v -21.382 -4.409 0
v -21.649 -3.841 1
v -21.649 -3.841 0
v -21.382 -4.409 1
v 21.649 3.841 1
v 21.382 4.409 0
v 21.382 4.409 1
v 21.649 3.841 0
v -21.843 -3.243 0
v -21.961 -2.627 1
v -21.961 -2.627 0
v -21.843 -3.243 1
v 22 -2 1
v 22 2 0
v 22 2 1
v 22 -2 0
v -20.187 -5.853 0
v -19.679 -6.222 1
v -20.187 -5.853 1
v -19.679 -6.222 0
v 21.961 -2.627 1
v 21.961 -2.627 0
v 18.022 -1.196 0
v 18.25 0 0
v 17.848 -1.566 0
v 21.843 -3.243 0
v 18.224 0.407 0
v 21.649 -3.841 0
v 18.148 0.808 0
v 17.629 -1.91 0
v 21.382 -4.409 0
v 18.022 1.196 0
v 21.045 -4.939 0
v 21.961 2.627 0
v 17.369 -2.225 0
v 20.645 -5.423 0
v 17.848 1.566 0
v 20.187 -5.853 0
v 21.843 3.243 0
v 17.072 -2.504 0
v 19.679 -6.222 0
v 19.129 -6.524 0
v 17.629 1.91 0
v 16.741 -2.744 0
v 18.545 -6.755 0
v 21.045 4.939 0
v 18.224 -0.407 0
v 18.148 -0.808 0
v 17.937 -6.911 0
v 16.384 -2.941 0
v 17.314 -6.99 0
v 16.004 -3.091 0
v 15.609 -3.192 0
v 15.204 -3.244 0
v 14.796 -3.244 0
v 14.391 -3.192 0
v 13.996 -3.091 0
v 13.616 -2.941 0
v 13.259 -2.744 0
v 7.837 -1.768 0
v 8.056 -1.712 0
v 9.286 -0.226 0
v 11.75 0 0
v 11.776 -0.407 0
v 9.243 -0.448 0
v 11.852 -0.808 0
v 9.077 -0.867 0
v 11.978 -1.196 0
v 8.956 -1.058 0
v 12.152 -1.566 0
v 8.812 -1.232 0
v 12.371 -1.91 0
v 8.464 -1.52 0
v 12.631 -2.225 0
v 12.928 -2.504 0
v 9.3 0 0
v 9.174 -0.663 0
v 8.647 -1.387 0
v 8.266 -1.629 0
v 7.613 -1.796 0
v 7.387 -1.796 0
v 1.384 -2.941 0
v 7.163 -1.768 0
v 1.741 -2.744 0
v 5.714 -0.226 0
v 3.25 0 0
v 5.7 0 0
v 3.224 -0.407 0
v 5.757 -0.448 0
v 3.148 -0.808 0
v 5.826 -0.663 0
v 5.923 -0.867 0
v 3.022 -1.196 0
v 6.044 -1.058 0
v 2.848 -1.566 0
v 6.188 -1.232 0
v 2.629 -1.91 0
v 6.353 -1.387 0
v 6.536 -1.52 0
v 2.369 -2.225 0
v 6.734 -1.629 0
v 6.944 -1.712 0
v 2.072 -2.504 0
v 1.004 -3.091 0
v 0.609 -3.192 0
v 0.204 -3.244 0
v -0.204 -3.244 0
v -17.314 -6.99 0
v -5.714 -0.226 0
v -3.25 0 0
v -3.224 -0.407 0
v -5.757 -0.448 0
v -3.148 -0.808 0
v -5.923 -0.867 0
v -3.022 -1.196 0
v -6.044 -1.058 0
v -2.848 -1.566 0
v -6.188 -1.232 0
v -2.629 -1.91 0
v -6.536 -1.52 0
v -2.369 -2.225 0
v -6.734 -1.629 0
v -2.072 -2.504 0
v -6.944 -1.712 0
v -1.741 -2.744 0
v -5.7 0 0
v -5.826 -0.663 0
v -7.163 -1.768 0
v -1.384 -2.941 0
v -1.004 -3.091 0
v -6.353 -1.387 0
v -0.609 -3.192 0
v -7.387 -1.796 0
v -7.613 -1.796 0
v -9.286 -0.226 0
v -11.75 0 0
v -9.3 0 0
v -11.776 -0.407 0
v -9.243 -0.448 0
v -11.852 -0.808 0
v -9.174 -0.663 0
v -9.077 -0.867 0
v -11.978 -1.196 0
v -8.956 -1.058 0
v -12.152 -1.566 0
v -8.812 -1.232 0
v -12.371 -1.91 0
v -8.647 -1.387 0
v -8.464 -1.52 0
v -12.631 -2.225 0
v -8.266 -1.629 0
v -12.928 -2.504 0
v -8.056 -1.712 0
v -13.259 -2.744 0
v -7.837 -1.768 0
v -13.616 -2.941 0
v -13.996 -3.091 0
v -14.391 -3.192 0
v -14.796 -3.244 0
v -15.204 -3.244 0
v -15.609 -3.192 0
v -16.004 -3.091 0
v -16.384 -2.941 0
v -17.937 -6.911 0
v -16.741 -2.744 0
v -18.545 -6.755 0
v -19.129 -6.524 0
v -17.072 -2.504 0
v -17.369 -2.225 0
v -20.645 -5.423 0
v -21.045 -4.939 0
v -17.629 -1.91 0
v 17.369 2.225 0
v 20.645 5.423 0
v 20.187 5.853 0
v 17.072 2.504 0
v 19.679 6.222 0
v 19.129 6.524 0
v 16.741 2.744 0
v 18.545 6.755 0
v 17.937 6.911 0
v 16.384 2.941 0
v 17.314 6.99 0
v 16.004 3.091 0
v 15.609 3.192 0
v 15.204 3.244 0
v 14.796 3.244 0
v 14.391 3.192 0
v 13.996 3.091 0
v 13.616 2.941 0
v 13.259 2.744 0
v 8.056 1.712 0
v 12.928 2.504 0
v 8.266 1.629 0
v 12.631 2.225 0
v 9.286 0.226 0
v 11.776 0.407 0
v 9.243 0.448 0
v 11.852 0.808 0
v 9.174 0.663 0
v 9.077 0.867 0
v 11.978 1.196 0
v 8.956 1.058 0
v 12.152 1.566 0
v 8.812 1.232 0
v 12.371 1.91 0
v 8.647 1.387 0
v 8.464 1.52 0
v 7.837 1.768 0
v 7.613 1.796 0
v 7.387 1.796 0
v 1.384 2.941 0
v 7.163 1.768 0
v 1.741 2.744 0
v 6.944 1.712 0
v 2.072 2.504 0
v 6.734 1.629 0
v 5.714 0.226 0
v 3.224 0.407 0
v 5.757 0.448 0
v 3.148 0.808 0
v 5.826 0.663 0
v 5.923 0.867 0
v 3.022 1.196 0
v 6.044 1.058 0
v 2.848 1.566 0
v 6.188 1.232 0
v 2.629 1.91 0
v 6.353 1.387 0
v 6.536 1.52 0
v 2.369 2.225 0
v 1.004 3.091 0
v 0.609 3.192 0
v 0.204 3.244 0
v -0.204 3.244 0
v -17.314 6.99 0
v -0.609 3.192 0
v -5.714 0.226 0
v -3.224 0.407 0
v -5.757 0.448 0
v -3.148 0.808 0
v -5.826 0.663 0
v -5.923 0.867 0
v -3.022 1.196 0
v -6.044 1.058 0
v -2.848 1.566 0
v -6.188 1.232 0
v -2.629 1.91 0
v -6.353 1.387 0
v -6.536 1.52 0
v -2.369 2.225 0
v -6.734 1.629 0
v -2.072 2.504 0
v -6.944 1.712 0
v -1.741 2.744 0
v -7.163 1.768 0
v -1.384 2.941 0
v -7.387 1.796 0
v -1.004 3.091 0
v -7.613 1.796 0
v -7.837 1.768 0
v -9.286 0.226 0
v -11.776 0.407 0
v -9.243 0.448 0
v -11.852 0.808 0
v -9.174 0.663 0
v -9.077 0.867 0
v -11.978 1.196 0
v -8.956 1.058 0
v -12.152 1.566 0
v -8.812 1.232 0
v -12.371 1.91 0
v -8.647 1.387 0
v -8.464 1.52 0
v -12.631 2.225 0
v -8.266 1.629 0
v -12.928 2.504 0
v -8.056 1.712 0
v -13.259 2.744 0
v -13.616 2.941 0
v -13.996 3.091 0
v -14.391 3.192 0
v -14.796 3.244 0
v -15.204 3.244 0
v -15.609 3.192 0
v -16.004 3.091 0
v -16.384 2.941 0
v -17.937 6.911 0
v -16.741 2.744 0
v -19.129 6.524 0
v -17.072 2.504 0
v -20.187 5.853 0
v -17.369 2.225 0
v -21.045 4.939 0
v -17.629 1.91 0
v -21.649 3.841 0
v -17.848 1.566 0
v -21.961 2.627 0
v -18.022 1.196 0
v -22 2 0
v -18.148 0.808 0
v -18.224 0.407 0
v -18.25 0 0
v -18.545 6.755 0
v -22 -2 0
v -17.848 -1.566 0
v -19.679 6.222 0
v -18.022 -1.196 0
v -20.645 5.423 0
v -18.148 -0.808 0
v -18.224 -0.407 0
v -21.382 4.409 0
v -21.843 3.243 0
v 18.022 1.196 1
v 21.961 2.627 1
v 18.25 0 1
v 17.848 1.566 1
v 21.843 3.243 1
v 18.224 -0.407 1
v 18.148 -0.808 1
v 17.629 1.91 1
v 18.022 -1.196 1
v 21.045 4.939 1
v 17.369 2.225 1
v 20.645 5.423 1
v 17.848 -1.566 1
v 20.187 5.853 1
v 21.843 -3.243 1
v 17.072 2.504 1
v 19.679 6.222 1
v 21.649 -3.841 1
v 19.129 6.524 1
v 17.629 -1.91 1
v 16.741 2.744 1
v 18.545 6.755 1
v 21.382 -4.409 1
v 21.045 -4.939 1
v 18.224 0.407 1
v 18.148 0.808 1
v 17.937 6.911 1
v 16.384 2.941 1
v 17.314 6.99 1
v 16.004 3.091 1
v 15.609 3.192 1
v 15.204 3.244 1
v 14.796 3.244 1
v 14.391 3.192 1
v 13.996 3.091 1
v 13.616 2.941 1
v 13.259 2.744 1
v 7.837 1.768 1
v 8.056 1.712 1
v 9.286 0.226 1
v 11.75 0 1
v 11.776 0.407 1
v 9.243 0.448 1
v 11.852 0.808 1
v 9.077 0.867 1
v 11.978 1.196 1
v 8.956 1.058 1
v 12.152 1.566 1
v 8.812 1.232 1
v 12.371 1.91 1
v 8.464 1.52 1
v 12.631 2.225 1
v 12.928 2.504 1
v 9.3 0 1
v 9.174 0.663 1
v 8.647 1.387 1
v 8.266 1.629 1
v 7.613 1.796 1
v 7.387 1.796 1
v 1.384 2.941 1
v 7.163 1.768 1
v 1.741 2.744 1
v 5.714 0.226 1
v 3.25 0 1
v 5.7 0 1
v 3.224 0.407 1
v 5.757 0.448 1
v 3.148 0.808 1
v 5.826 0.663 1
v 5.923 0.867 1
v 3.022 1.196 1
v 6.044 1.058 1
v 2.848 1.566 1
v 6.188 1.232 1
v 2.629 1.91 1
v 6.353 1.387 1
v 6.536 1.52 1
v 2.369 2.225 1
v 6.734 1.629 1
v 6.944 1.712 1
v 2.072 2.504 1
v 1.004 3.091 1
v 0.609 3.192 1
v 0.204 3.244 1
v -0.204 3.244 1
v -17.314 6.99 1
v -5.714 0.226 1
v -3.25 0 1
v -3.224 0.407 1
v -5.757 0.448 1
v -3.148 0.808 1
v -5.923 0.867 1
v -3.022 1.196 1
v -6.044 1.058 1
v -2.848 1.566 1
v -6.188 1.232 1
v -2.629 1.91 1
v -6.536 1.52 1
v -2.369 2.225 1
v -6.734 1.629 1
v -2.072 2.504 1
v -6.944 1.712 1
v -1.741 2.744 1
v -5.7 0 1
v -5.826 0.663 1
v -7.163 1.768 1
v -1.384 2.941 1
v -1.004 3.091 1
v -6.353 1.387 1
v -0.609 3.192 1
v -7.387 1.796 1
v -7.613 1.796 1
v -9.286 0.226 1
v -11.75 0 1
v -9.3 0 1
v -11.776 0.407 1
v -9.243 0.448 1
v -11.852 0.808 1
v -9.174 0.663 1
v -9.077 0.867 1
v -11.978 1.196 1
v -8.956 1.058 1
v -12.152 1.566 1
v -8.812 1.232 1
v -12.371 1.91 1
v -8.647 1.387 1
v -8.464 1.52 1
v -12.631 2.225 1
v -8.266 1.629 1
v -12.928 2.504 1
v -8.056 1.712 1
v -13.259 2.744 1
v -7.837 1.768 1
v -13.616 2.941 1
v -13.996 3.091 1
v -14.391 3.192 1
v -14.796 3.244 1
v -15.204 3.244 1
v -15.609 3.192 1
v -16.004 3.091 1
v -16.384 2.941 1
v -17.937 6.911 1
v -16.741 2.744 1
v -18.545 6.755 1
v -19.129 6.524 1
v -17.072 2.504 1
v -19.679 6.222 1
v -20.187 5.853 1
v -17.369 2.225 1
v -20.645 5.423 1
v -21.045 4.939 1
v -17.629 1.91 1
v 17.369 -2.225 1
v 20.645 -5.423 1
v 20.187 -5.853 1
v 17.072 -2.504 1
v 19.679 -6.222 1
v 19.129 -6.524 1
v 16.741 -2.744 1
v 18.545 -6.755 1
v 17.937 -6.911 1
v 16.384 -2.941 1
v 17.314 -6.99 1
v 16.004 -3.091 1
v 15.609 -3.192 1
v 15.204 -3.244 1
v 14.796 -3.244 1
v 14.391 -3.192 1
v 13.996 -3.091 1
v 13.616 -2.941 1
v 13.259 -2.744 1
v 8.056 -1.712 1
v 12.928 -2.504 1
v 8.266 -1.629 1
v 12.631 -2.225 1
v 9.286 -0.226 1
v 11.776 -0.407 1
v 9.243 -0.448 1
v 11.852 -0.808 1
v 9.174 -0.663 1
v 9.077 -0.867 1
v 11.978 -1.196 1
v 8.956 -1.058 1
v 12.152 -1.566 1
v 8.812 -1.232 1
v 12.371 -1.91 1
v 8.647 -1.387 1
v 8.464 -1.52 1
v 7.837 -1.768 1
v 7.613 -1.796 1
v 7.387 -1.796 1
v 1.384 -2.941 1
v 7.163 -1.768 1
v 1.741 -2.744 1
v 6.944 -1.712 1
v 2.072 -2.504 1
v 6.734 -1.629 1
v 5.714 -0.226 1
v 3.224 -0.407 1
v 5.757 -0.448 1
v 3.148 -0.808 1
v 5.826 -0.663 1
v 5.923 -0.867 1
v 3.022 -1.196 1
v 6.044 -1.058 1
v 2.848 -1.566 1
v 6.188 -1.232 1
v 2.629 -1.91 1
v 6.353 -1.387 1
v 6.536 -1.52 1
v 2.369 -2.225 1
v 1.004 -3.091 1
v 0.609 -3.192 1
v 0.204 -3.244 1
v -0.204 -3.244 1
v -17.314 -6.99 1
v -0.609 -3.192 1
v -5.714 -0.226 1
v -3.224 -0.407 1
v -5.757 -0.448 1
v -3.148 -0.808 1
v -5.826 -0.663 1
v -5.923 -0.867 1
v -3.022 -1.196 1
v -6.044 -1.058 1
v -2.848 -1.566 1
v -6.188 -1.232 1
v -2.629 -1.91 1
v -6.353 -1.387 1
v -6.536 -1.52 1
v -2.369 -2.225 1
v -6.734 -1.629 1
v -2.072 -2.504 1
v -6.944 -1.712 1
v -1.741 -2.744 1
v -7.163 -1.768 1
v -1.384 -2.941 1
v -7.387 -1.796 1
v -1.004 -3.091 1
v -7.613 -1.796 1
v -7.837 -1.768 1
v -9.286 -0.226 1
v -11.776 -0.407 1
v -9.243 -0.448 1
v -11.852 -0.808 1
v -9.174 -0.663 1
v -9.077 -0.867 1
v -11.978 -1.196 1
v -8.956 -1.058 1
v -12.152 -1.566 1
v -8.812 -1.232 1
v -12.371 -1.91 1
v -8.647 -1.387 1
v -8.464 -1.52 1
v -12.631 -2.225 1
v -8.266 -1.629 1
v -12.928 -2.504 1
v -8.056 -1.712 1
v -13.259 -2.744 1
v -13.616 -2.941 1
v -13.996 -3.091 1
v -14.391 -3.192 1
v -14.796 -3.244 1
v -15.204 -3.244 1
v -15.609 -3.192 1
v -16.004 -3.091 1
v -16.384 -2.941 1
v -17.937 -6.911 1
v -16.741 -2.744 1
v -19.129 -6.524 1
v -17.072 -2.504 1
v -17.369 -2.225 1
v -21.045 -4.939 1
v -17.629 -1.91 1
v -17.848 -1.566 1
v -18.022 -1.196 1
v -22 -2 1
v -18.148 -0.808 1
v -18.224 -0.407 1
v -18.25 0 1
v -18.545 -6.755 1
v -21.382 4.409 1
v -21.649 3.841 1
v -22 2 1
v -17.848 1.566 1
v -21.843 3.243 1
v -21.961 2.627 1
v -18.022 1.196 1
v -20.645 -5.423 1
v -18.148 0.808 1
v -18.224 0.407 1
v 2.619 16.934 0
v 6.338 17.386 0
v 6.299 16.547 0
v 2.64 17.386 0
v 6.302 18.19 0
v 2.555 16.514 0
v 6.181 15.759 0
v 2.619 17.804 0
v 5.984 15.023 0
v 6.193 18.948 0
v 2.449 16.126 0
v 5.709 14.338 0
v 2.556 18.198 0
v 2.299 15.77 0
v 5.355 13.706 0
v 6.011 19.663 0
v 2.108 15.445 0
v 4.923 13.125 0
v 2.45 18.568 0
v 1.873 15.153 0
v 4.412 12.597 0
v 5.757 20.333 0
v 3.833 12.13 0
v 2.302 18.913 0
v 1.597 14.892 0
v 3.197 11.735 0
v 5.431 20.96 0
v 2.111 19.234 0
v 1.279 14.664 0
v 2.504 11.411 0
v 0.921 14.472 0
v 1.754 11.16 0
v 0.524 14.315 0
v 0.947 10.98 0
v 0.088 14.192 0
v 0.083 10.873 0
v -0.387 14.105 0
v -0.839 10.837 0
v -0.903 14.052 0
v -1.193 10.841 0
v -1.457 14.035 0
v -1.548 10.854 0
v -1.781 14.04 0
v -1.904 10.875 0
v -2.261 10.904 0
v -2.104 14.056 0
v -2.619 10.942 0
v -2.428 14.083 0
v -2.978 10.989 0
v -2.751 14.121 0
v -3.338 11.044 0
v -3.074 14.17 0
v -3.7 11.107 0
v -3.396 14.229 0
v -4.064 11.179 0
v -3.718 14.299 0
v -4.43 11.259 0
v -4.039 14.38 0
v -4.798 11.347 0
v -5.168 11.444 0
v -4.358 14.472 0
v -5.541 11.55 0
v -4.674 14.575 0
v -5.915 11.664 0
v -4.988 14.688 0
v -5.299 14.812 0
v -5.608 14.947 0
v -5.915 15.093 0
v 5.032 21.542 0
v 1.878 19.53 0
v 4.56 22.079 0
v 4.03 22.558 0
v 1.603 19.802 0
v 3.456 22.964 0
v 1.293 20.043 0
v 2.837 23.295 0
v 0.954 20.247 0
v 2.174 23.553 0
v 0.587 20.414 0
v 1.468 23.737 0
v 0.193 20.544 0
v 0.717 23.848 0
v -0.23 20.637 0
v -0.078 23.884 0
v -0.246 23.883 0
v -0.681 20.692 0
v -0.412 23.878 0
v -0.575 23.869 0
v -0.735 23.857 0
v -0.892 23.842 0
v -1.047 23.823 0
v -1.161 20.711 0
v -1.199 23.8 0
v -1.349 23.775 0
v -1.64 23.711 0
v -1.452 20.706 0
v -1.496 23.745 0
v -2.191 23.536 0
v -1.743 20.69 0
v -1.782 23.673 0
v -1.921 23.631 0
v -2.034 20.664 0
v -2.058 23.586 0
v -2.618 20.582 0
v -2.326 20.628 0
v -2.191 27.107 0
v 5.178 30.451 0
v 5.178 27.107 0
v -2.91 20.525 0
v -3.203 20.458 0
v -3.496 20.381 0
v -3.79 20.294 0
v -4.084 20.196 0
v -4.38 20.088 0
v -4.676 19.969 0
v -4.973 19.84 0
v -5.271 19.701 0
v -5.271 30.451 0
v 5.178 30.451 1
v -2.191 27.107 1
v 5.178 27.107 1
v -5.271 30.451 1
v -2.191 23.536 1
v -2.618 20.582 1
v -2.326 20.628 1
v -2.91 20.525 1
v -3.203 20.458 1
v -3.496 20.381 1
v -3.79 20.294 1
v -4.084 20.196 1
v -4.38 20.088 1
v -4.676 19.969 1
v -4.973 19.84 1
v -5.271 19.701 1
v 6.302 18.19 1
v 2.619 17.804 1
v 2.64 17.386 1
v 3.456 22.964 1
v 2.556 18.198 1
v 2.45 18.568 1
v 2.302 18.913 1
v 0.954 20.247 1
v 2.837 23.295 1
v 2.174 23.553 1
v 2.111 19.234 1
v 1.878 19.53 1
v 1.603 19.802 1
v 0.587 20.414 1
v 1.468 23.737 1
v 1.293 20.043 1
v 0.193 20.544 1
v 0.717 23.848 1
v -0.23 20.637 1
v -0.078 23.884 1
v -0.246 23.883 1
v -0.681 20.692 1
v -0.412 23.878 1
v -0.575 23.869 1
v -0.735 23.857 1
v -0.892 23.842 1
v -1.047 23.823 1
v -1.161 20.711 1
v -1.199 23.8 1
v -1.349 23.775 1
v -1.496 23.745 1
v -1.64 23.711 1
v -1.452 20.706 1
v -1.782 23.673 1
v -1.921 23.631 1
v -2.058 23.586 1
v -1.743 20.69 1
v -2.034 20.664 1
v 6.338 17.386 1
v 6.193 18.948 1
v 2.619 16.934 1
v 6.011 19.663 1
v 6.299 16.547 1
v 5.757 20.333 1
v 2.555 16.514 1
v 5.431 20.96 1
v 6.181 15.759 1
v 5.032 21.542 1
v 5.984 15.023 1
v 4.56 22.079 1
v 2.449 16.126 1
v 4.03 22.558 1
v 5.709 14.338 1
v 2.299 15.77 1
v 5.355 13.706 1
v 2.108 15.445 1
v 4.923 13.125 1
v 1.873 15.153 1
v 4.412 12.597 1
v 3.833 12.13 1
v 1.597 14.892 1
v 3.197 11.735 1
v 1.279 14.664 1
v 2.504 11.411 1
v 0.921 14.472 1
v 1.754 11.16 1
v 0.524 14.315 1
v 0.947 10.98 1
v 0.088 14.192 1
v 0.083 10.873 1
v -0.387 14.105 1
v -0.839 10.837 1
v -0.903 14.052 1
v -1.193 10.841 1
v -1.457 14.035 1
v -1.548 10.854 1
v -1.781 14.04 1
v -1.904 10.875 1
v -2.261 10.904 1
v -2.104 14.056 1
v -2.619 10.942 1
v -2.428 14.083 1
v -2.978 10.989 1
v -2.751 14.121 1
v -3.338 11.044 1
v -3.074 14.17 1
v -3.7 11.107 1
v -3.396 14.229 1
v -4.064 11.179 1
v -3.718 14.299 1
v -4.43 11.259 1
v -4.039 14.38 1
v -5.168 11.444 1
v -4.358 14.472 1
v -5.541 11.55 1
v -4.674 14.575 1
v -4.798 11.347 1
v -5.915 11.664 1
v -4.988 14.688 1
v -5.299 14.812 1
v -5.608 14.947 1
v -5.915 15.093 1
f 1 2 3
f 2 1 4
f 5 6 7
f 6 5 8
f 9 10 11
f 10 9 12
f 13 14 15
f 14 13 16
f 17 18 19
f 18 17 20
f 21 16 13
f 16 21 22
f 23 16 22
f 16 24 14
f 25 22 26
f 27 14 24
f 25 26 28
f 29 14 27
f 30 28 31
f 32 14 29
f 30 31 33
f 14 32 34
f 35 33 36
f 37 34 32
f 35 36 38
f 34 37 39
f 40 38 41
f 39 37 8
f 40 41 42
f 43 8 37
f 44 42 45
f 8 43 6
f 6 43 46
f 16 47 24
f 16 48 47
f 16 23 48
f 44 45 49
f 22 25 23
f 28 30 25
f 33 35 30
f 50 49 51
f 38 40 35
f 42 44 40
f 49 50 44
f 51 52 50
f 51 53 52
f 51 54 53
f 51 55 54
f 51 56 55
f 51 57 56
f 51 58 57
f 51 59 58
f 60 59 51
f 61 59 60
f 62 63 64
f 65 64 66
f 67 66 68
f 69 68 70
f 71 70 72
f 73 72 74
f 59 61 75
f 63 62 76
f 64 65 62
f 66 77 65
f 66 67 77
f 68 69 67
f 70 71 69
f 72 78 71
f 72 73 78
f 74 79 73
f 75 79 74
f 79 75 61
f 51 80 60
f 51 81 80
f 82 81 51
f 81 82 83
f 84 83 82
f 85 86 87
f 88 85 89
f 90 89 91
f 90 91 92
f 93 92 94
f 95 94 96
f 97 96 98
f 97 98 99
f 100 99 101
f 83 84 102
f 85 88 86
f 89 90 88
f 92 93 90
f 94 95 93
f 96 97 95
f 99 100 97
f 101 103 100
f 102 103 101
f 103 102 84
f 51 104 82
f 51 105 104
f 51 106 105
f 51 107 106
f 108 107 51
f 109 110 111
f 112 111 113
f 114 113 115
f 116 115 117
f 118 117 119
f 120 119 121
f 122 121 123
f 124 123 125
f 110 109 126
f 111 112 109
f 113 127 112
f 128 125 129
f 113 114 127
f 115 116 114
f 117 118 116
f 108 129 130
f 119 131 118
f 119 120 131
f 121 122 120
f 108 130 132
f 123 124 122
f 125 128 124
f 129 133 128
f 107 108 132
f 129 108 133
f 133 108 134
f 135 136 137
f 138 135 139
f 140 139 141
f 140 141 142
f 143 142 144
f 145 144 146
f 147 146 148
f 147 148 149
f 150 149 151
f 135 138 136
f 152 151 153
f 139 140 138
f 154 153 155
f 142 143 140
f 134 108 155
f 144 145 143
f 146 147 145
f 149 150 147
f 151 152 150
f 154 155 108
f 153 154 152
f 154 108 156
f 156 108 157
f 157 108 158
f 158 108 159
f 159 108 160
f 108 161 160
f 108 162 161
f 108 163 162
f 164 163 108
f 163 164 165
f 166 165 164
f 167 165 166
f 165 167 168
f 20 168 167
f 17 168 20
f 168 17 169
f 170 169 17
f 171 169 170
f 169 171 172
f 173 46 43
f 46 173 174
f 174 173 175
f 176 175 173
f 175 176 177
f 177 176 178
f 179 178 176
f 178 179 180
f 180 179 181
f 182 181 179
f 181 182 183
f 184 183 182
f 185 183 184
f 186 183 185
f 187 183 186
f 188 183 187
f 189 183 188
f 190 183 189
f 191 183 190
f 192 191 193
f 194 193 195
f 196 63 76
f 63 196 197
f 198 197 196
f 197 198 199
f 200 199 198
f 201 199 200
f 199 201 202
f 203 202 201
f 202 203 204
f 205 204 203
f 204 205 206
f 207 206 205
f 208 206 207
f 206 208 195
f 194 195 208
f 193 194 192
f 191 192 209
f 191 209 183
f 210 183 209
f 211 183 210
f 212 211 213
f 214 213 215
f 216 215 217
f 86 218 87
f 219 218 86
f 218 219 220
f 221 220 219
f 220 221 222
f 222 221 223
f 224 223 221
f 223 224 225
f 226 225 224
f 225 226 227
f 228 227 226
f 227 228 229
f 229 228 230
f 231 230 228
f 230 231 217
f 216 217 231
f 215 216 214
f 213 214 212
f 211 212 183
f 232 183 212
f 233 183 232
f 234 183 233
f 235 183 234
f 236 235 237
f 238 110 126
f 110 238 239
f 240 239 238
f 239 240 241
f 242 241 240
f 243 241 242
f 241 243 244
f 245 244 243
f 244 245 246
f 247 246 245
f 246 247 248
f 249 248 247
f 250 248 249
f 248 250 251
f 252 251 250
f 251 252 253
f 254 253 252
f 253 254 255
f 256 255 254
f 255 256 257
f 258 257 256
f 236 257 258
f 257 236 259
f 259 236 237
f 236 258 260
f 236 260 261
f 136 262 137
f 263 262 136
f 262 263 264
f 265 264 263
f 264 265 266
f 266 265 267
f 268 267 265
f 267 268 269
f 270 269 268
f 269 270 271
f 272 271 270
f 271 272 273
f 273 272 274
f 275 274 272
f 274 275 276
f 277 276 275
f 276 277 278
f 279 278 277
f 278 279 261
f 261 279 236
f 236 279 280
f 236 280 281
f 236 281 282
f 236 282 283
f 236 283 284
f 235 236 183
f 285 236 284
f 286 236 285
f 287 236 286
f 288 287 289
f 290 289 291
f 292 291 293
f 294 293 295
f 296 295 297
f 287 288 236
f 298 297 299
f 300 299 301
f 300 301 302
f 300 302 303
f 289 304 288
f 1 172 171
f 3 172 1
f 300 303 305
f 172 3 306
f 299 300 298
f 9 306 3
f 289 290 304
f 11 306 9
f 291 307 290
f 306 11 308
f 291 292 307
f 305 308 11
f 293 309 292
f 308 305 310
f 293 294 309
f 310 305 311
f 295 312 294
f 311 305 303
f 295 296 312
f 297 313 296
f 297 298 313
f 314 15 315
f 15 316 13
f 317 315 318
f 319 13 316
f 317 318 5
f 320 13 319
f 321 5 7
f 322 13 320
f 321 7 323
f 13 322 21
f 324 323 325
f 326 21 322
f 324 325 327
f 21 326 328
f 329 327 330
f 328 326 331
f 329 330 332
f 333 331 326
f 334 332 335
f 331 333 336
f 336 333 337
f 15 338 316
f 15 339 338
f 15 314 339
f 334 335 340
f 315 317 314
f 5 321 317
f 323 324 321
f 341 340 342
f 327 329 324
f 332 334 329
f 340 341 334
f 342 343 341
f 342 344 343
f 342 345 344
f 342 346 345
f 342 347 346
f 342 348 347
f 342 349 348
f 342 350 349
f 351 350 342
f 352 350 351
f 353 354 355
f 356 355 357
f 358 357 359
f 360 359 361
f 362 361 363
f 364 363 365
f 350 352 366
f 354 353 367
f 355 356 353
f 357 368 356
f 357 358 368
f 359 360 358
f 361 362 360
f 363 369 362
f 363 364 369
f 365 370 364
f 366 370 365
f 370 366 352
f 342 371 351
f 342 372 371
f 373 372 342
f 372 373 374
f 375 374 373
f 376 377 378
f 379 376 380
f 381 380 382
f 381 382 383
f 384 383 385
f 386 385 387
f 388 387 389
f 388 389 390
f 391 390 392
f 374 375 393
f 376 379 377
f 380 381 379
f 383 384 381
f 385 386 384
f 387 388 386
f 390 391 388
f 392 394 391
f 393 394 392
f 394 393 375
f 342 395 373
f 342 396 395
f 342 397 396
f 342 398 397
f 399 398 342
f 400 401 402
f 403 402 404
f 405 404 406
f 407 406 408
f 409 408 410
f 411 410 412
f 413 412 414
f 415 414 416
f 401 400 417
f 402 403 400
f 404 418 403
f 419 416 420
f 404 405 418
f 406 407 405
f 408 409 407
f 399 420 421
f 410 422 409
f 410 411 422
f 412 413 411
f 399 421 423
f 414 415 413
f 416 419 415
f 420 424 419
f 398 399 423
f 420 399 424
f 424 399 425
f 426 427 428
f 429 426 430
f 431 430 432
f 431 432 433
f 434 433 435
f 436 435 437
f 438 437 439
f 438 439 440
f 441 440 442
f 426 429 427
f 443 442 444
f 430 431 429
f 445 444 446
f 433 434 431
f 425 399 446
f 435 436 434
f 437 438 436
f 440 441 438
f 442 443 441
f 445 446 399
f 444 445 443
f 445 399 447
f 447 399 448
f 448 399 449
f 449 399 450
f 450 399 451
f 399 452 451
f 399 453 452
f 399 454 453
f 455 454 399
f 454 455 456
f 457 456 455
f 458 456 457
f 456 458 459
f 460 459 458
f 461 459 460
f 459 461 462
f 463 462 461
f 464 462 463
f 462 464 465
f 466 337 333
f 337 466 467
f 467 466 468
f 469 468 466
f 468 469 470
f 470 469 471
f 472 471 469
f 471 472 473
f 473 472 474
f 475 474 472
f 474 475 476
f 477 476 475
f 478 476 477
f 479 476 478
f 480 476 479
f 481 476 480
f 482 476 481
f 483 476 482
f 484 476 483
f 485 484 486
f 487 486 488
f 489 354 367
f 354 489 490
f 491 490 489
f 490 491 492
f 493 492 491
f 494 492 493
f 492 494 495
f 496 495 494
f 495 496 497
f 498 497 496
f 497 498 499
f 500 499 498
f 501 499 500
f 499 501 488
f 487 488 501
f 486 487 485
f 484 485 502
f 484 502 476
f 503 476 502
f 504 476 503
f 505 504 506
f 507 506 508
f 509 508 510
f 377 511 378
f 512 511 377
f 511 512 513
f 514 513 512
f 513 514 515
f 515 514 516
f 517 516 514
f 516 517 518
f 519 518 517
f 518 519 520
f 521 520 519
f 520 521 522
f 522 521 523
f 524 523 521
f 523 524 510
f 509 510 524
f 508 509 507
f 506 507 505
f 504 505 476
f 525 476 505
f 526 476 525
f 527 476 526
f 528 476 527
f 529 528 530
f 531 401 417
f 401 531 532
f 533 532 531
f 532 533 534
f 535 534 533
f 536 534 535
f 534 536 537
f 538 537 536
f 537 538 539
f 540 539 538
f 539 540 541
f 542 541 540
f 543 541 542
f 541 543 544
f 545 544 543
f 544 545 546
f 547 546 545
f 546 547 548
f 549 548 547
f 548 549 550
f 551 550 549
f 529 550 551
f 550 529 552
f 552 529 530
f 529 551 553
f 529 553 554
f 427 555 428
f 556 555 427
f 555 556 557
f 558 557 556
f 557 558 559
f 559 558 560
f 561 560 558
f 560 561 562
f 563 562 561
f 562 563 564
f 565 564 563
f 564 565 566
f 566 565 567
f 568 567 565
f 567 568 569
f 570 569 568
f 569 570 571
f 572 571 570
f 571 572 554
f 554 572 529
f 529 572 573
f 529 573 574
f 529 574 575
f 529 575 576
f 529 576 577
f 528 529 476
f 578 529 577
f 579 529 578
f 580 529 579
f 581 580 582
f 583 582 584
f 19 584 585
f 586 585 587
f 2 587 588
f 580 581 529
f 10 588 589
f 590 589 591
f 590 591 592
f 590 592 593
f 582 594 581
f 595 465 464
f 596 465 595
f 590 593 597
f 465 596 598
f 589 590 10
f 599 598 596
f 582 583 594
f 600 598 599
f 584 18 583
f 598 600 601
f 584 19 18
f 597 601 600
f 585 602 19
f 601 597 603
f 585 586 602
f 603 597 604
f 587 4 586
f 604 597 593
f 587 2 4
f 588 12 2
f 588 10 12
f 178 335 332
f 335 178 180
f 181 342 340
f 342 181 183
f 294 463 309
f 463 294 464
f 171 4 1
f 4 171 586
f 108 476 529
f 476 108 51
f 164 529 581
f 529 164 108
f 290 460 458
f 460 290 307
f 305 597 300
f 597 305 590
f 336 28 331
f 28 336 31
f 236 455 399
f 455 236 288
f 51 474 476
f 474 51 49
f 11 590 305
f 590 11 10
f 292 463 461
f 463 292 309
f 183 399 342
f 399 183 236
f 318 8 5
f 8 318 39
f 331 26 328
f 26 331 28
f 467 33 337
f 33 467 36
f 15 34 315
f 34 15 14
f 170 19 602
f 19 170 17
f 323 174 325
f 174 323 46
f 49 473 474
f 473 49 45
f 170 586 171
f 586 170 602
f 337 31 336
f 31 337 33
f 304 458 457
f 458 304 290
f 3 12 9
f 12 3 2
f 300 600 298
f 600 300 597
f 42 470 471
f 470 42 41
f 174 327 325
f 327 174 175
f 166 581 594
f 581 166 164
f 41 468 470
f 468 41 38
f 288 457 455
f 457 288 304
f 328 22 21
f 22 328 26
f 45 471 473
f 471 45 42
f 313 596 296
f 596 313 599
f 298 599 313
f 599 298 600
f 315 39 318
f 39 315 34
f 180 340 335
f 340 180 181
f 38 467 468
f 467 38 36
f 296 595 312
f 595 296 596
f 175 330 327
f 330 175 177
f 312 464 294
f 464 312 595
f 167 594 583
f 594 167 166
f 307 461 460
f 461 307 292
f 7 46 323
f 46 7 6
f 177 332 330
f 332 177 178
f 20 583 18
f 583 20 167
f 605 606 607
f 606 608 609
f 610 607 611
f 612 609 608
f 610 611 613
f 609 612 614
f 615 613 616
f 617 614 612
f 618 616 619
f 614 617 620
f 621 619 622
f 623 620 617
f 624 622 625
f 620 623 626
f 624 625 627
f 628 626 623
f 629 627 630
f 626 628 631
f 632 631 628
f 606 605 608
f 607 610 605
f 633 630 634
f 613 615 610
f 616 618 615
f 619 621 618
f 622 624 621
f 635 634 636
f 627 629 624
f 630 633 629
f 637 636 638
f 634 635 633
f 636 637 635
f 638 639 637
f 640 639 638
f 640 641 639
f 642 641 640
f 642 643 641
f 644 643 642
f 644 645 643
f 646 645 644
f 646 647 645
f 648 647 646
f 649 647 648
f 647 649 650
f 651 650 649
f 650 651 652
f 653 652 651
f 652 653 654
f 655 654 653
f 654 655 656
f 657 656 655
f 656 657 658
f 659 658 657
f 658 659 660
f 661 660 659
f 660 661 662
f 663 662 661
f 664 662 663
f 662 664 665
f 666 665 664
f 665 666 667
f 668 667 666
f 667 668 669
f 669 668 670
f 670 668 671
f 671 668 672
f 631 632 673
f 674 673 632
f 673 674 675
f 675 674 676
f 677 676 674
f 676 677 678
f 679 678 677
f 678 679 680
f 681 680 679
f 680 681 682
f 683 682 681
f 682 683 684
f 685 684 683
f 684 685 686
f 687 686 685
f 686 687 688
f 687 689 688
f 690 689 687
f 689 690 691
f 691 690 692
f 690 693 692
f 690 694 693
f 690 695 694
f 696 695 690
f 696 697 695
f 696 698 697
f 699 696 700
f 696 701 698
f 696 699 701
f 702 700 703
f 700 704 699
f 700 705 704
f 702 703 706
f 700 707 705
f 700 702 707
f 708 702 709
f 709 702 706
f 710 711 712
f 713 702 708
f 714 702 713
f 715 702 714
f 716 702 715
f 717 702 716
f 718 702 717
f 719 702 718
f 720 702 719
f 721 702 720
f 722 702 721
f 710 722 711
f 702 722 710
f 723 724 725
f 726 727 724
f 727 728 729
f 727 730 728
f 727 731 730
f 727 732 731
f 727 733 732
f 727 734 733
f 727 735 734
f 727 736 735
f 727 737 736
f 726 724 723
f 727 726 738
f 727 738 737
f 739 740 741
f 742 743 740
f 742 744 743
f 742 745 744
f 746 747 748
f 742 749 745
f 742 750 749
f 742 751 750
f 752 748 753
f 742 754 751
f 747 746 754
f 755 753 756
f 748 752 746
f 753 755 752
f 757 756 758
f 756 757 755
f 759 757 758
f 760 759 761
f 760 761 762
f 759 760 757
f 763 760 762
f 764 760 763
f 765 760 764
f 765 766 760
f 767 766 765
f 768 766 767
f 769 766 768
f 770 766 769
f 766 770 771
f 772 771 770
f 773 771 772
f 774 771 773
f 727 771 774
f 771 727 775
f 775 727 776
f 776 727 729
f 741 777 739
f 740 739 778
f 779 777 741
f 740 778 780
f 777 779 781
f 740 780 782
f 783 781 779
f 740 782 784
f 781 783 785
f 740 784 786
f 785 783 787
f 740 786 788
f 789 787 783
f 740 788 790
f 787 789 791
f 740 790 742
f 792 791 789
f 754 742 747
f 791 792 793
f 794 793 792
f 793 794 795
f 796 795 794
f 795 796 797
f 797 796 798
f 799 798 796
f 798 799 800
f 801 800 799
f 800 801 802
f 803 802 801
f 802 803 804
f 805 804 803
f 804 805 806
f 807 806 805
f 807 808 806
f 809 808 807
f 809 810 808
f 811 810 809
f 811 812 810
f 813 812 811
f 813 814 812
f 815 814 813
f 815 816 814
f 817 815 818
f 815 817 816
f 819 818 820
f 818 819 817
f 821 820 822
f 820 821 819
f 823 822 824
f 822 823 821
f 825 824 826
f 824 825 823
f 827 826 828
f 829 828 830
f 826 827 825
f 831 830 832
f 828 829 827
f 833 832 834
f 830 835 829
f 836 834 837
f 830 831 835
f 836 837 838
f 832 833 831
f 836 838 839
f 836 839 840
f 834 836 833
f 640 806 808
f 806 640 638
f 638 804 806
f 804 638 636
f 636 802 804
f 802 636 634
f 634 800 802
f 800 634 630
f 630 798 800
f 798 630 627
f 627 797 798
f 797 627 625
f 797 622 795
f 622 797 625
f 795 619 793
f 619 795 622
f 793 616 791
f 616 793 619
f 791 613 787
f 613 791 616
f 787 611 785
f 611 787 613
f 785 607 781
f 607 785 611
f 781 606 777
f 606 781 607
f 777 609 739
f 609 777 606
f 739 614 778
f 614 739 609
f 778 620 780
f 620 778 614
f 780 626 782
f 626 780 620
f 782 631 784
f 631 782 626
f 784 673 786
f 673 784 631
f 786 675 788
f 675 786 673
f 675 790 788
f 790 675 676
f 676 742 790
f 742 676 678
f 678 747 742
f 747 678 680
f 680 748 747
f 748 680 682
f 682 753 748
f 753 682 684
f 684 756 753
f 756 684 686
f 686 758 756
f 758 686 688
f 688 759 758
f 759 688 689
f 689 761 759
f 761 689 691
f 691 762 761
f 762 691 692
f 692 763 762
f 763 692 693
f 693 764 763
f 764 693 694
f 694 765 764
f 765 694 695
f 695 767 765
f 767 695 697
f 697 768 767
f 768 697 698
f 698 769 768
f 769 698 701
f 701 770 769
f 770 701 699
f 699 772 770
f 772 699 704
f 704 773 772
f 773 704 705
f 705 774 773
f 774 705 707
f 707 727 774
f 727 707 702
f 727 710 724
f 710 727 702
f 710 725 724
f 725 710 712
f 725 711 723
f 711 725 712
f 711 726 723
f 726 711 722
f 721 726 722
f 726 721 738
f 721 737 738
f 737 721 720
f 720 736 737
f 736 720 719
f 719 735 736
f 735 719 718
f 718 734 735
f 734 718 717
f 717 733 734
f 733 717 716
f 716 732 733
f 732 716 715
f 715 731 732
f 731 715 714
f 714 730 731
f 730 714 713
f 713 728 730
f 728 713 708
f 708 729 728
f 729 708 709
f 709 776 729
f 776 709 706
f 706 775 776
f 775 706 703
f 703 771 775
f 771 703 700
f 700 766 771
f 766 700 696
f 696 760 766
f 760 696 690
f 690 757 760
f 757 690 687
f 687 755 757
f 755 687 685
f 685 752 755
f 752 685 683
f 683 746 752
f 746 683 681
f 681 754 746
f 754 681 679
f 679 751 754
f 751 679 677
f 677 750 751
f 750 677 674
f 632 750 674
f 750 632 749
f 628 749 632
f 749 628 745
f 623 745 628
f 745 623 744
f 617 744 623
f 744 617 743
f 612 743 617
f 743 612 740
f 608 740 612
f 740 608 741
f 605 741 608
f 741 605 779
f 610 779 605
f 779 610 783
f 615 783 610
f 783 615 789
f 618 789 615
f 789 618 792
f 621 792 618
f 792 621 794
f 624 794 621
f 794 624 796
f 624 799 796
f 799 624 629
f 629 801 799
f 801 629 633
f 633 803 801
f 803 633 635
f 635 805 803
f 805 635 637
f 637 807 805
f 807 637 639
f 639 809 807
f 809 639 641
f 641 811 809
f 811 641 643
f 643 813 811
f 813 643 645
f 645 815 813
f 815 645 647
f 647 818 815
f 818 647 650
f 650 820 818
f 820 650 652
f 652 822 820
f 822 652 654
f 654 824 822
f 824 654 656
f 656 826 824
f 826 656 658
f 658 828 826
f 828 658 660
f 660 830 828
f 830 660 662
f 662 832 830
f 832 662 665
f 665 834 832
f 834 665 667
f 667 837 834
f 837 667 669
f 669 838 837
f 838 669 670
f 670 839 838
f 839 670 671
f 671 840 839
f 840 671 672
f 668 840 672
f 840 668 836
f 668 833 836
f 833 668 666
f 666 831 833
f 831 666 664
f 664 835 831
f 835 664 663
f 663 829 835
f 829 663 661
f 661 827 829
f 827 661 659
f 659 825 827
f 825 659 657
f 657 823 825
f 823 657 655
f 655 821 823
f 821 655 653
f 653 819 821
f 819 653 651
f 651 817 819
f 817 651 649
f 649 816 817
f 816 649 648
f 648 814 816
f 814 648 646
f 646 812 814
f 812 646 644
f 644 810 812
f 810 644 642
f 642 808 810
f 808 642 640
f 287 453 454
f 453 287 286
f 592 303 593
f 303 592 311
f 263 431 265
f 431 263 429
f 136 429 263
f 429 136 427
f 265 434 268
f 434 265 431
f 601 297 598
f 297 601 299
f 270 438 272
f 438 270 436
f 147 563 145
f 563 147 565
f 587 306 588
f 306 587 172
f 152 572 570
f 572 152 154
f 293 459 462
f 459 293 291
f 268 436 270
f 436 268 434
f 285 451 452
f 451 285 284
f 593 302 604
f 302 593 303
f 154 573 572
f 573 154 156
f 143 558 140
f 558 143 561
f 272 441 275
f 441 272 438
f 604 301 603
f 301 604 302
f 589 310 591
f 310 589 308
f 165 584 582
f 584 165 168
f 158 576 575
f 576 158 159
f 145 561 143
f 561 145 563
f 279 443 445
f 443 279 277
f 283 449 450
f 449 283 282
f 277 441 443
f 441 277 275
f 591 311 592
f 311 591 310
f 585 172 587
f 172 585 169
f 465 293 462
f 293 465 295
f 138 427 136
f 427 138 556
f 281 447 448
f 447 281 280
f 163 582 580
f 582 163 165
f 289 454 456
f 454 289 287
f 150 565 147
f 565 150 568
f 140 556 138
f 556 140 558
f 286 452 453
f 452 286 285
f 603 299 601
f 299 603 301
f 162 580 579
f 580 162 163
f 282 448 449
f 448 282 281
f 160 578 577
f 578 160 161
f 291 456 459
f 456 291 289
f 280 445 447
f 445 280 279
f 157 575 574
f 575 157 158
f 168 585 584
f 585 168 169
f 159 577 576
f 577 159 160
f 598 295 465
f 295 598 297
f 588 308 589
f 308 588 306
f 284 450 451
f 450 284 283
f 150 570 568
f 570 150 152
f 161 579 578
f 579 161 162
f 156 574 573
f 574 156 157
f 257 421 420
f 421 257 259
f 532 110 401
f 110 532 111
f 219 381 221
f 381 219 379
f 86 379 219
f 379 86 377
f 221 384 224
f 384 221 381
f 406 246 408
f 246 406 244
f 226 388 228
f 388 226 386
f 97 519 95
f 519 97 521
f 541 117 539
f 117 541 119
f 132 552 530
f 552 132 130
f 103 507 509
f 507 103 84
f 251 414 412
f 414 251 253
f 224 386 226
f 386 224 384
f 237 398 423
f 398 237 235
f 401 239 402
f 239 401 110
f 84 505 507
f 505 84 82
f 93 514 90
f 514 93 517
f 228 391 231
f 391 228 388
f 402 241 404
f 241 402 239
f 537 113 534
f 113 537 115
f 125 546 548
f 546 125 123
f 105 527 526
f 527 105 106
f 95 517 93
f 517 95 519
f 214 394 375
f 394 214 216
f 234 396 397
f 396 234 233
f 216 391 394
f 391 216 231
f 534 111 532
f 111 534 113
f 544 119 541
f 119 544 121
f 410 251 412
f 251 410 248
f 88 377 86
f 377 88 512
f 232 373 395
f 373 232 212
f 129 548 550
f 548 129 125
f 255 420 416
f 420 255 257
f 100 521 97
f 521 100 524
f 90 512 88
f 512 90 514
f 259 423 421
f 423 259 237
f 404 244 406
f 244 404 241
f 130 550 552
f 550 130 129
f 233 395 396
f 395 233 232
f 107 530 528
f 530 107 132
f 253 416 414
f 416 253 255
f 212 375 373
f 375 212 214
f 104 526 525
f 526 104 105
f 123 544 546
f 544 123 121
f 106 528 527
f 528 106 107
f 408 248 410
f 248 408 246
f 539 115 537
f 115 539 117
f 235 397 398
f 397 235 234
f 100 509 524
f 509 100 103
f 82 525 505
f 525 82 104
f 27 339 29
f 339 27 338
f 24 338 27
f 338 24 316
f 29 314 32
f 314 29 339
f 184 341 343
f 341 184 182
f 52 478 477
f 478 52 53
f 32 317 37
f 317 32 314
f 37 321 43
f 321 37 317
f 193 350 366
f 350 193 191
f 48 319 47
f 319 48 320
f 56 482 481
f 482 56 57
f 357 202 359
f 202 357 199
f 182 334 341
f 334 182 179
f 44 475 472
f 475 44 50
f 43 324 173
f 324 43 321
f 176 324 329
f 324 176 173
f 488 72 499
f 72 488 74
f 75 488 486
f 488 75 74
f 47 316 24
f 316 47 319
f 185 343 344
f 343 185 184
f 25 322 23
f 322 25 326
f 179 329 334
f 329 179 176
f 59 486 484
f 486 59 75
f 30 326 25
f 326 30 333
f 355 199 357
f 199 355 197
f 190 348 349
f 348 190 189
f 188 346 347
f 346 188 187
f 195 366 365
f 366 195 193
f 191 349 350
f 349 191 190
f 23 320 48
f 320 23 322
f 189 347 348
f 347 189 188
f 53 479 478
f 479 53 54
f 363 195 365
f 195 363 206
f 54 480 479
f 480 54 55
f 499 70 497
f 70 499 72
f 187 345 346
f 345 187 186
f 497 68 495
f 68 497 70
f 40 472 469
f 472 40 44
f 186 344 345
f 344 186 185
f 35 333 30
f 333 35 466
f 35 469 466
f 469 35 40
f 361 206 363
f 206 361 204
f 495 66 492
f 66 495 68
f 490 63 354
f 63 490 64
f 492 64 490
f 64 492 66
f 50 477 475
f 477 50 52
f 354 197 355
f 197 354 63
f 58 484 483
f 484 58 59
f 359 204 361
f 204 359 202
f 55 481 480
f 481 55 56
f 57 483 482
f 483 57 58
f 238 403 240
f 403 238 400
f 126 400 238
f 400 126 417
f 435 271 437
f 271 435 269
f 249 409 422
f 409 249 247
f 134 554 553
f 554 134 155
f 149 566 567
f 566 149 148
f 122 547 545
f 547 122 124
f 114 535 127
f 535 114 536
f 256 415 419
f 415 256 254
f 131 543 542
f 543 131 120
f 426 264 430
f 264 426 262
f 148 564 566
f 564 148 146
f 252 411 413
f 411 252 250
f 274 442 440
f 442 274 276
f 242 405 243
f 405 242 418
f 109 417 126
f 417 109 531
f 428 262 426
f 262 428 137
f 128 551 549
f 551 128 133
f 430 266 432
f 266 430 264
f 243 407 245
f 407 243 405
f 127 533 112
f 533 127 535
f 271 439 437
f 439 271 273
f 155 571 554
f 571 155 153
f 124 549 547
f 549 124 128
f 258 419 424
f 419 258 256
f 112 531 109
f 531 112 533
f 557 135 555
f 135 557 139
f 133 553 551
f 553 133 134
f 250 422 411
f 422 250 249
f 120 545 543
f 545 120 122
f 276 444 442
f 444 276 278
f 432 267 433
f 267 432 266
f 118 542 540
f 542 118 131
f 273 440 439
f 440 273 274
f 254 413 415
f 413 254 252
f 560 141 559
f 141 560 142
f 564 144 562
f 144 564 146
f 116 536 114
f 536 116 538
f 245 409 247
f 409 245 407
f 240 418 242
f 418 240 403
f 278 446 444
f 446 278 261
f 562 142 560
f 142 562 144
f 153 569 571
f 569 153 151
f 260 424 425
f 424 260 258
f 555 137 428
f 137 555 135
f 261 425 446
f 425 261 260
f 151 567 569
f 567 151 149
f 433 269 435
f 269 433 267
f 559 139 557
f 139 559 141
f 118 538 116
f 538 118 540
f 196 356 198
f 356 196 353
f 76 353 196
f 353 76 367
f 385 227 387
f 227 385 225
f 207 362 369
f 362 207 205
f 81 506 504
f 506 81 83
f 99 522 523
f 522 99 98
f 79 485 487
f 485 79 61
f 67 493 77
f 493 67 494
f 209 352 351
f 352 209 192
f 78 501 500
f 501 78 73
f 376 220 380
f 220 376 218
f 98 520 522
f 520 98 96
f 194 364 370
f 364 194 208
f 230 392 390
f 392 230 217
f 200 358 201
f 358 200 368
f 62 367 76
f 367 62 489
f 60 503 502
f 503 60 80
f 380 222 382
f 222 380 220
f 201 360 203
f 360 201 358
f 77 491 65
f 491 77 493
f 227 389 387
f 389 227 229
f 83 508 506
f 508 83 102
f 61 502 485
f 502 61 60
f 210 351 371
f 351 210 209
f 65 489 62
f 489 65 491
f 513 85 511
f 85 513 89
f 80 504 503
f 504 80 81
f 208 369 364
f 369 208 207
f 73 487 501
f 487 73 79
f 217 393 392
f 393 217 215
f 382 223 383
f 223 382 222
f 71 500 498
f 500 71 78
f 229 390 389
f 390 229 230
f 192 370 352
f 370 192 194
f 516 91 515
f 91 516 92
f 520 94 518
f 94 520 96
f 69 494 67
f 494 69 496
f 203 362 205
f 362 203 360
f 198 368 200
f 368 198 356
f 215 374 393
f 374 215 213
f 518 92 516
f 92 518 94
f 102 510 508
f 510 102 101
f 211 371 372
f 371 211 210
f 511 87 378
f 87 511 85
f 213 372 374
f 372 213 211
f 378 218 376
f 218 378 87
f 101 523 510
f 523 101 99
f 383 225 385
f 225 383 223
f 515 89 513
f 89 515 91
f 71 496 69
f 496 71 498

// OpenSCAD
$fn = 50;


difference() {
	union() {
		hull() {
			translate(v = [-17.0000000000, 2.0000000000, 0]) {
				cylinder(h = 1, r = 5);
			}
			translate(v = [17.0000000000, 2.0000000000, 0]) {
				cylinder(h = 1, r = 5);
			}
			translate(v = [-17.0000000000, -2.0000000000, 0]) {
				cylinder(h = 1, r = 5);
			}
			translate(v = [17.0000000000, -2.0000000000, 0]) {
				cylinder(h = 1, r = 5);
			}
		}
		translate(v = [0, 30.0000000000, 0]) {
			linear_extrude(height = 1) {
				text(font = "DejaVu Sans Mono:style=Bold", halign = "center", size = 19.0000000000, text = "5", valign = "top");
			}
		}
	}
	union() {
		translate(v = [-15.0000000000, 0.0000000000, 0]) {
			translate(v = [0, 0, -100]) {
				cylinder(h = 200, r = 3.2500000000);
			}
		}
		translate(v = [0, 0, -100]) {
			cylinder(h = 200, r = 3.2500000000);
		}
		translate(v = [15.0000000000, 0.0000000000, 0]) {
			translate(v = [0, 0, -100]) {
				cylinder(h = 200, r = 3.2500000000);
			}
		}
		translate(v = [-15.0000000000, 0.0000000000, 0]) {
			translate(v = [0, 0, -100]) {
				cylinder(h = 200, r = 1.8000000000);
			}
		}
		translate(v = [-7.5000000000, 0.0000000000, 0]) {
			translate(v = [0, 0, -100]) {
				cylinder(h = 200, r = 1.8000000000);
			}
		}
		translate(v = [0, 0, -100]) {
			cylinder(h = 200, r = 1.8000000000);
		}
		translate(v = [7.5000000000, 0.0000000000, 0]) {
			translate(v = [0, 0, -100]) {
				cylinder(h = 200, r = 1.8000000000);
			}
		}
		translate(v = [15.0000000000, 0.0000000000, 0]) {
			translate(v = [0, 0, -100]) {
				cylinder(h = 200, r = 1.8000000000);
			}
		}
	}
}
